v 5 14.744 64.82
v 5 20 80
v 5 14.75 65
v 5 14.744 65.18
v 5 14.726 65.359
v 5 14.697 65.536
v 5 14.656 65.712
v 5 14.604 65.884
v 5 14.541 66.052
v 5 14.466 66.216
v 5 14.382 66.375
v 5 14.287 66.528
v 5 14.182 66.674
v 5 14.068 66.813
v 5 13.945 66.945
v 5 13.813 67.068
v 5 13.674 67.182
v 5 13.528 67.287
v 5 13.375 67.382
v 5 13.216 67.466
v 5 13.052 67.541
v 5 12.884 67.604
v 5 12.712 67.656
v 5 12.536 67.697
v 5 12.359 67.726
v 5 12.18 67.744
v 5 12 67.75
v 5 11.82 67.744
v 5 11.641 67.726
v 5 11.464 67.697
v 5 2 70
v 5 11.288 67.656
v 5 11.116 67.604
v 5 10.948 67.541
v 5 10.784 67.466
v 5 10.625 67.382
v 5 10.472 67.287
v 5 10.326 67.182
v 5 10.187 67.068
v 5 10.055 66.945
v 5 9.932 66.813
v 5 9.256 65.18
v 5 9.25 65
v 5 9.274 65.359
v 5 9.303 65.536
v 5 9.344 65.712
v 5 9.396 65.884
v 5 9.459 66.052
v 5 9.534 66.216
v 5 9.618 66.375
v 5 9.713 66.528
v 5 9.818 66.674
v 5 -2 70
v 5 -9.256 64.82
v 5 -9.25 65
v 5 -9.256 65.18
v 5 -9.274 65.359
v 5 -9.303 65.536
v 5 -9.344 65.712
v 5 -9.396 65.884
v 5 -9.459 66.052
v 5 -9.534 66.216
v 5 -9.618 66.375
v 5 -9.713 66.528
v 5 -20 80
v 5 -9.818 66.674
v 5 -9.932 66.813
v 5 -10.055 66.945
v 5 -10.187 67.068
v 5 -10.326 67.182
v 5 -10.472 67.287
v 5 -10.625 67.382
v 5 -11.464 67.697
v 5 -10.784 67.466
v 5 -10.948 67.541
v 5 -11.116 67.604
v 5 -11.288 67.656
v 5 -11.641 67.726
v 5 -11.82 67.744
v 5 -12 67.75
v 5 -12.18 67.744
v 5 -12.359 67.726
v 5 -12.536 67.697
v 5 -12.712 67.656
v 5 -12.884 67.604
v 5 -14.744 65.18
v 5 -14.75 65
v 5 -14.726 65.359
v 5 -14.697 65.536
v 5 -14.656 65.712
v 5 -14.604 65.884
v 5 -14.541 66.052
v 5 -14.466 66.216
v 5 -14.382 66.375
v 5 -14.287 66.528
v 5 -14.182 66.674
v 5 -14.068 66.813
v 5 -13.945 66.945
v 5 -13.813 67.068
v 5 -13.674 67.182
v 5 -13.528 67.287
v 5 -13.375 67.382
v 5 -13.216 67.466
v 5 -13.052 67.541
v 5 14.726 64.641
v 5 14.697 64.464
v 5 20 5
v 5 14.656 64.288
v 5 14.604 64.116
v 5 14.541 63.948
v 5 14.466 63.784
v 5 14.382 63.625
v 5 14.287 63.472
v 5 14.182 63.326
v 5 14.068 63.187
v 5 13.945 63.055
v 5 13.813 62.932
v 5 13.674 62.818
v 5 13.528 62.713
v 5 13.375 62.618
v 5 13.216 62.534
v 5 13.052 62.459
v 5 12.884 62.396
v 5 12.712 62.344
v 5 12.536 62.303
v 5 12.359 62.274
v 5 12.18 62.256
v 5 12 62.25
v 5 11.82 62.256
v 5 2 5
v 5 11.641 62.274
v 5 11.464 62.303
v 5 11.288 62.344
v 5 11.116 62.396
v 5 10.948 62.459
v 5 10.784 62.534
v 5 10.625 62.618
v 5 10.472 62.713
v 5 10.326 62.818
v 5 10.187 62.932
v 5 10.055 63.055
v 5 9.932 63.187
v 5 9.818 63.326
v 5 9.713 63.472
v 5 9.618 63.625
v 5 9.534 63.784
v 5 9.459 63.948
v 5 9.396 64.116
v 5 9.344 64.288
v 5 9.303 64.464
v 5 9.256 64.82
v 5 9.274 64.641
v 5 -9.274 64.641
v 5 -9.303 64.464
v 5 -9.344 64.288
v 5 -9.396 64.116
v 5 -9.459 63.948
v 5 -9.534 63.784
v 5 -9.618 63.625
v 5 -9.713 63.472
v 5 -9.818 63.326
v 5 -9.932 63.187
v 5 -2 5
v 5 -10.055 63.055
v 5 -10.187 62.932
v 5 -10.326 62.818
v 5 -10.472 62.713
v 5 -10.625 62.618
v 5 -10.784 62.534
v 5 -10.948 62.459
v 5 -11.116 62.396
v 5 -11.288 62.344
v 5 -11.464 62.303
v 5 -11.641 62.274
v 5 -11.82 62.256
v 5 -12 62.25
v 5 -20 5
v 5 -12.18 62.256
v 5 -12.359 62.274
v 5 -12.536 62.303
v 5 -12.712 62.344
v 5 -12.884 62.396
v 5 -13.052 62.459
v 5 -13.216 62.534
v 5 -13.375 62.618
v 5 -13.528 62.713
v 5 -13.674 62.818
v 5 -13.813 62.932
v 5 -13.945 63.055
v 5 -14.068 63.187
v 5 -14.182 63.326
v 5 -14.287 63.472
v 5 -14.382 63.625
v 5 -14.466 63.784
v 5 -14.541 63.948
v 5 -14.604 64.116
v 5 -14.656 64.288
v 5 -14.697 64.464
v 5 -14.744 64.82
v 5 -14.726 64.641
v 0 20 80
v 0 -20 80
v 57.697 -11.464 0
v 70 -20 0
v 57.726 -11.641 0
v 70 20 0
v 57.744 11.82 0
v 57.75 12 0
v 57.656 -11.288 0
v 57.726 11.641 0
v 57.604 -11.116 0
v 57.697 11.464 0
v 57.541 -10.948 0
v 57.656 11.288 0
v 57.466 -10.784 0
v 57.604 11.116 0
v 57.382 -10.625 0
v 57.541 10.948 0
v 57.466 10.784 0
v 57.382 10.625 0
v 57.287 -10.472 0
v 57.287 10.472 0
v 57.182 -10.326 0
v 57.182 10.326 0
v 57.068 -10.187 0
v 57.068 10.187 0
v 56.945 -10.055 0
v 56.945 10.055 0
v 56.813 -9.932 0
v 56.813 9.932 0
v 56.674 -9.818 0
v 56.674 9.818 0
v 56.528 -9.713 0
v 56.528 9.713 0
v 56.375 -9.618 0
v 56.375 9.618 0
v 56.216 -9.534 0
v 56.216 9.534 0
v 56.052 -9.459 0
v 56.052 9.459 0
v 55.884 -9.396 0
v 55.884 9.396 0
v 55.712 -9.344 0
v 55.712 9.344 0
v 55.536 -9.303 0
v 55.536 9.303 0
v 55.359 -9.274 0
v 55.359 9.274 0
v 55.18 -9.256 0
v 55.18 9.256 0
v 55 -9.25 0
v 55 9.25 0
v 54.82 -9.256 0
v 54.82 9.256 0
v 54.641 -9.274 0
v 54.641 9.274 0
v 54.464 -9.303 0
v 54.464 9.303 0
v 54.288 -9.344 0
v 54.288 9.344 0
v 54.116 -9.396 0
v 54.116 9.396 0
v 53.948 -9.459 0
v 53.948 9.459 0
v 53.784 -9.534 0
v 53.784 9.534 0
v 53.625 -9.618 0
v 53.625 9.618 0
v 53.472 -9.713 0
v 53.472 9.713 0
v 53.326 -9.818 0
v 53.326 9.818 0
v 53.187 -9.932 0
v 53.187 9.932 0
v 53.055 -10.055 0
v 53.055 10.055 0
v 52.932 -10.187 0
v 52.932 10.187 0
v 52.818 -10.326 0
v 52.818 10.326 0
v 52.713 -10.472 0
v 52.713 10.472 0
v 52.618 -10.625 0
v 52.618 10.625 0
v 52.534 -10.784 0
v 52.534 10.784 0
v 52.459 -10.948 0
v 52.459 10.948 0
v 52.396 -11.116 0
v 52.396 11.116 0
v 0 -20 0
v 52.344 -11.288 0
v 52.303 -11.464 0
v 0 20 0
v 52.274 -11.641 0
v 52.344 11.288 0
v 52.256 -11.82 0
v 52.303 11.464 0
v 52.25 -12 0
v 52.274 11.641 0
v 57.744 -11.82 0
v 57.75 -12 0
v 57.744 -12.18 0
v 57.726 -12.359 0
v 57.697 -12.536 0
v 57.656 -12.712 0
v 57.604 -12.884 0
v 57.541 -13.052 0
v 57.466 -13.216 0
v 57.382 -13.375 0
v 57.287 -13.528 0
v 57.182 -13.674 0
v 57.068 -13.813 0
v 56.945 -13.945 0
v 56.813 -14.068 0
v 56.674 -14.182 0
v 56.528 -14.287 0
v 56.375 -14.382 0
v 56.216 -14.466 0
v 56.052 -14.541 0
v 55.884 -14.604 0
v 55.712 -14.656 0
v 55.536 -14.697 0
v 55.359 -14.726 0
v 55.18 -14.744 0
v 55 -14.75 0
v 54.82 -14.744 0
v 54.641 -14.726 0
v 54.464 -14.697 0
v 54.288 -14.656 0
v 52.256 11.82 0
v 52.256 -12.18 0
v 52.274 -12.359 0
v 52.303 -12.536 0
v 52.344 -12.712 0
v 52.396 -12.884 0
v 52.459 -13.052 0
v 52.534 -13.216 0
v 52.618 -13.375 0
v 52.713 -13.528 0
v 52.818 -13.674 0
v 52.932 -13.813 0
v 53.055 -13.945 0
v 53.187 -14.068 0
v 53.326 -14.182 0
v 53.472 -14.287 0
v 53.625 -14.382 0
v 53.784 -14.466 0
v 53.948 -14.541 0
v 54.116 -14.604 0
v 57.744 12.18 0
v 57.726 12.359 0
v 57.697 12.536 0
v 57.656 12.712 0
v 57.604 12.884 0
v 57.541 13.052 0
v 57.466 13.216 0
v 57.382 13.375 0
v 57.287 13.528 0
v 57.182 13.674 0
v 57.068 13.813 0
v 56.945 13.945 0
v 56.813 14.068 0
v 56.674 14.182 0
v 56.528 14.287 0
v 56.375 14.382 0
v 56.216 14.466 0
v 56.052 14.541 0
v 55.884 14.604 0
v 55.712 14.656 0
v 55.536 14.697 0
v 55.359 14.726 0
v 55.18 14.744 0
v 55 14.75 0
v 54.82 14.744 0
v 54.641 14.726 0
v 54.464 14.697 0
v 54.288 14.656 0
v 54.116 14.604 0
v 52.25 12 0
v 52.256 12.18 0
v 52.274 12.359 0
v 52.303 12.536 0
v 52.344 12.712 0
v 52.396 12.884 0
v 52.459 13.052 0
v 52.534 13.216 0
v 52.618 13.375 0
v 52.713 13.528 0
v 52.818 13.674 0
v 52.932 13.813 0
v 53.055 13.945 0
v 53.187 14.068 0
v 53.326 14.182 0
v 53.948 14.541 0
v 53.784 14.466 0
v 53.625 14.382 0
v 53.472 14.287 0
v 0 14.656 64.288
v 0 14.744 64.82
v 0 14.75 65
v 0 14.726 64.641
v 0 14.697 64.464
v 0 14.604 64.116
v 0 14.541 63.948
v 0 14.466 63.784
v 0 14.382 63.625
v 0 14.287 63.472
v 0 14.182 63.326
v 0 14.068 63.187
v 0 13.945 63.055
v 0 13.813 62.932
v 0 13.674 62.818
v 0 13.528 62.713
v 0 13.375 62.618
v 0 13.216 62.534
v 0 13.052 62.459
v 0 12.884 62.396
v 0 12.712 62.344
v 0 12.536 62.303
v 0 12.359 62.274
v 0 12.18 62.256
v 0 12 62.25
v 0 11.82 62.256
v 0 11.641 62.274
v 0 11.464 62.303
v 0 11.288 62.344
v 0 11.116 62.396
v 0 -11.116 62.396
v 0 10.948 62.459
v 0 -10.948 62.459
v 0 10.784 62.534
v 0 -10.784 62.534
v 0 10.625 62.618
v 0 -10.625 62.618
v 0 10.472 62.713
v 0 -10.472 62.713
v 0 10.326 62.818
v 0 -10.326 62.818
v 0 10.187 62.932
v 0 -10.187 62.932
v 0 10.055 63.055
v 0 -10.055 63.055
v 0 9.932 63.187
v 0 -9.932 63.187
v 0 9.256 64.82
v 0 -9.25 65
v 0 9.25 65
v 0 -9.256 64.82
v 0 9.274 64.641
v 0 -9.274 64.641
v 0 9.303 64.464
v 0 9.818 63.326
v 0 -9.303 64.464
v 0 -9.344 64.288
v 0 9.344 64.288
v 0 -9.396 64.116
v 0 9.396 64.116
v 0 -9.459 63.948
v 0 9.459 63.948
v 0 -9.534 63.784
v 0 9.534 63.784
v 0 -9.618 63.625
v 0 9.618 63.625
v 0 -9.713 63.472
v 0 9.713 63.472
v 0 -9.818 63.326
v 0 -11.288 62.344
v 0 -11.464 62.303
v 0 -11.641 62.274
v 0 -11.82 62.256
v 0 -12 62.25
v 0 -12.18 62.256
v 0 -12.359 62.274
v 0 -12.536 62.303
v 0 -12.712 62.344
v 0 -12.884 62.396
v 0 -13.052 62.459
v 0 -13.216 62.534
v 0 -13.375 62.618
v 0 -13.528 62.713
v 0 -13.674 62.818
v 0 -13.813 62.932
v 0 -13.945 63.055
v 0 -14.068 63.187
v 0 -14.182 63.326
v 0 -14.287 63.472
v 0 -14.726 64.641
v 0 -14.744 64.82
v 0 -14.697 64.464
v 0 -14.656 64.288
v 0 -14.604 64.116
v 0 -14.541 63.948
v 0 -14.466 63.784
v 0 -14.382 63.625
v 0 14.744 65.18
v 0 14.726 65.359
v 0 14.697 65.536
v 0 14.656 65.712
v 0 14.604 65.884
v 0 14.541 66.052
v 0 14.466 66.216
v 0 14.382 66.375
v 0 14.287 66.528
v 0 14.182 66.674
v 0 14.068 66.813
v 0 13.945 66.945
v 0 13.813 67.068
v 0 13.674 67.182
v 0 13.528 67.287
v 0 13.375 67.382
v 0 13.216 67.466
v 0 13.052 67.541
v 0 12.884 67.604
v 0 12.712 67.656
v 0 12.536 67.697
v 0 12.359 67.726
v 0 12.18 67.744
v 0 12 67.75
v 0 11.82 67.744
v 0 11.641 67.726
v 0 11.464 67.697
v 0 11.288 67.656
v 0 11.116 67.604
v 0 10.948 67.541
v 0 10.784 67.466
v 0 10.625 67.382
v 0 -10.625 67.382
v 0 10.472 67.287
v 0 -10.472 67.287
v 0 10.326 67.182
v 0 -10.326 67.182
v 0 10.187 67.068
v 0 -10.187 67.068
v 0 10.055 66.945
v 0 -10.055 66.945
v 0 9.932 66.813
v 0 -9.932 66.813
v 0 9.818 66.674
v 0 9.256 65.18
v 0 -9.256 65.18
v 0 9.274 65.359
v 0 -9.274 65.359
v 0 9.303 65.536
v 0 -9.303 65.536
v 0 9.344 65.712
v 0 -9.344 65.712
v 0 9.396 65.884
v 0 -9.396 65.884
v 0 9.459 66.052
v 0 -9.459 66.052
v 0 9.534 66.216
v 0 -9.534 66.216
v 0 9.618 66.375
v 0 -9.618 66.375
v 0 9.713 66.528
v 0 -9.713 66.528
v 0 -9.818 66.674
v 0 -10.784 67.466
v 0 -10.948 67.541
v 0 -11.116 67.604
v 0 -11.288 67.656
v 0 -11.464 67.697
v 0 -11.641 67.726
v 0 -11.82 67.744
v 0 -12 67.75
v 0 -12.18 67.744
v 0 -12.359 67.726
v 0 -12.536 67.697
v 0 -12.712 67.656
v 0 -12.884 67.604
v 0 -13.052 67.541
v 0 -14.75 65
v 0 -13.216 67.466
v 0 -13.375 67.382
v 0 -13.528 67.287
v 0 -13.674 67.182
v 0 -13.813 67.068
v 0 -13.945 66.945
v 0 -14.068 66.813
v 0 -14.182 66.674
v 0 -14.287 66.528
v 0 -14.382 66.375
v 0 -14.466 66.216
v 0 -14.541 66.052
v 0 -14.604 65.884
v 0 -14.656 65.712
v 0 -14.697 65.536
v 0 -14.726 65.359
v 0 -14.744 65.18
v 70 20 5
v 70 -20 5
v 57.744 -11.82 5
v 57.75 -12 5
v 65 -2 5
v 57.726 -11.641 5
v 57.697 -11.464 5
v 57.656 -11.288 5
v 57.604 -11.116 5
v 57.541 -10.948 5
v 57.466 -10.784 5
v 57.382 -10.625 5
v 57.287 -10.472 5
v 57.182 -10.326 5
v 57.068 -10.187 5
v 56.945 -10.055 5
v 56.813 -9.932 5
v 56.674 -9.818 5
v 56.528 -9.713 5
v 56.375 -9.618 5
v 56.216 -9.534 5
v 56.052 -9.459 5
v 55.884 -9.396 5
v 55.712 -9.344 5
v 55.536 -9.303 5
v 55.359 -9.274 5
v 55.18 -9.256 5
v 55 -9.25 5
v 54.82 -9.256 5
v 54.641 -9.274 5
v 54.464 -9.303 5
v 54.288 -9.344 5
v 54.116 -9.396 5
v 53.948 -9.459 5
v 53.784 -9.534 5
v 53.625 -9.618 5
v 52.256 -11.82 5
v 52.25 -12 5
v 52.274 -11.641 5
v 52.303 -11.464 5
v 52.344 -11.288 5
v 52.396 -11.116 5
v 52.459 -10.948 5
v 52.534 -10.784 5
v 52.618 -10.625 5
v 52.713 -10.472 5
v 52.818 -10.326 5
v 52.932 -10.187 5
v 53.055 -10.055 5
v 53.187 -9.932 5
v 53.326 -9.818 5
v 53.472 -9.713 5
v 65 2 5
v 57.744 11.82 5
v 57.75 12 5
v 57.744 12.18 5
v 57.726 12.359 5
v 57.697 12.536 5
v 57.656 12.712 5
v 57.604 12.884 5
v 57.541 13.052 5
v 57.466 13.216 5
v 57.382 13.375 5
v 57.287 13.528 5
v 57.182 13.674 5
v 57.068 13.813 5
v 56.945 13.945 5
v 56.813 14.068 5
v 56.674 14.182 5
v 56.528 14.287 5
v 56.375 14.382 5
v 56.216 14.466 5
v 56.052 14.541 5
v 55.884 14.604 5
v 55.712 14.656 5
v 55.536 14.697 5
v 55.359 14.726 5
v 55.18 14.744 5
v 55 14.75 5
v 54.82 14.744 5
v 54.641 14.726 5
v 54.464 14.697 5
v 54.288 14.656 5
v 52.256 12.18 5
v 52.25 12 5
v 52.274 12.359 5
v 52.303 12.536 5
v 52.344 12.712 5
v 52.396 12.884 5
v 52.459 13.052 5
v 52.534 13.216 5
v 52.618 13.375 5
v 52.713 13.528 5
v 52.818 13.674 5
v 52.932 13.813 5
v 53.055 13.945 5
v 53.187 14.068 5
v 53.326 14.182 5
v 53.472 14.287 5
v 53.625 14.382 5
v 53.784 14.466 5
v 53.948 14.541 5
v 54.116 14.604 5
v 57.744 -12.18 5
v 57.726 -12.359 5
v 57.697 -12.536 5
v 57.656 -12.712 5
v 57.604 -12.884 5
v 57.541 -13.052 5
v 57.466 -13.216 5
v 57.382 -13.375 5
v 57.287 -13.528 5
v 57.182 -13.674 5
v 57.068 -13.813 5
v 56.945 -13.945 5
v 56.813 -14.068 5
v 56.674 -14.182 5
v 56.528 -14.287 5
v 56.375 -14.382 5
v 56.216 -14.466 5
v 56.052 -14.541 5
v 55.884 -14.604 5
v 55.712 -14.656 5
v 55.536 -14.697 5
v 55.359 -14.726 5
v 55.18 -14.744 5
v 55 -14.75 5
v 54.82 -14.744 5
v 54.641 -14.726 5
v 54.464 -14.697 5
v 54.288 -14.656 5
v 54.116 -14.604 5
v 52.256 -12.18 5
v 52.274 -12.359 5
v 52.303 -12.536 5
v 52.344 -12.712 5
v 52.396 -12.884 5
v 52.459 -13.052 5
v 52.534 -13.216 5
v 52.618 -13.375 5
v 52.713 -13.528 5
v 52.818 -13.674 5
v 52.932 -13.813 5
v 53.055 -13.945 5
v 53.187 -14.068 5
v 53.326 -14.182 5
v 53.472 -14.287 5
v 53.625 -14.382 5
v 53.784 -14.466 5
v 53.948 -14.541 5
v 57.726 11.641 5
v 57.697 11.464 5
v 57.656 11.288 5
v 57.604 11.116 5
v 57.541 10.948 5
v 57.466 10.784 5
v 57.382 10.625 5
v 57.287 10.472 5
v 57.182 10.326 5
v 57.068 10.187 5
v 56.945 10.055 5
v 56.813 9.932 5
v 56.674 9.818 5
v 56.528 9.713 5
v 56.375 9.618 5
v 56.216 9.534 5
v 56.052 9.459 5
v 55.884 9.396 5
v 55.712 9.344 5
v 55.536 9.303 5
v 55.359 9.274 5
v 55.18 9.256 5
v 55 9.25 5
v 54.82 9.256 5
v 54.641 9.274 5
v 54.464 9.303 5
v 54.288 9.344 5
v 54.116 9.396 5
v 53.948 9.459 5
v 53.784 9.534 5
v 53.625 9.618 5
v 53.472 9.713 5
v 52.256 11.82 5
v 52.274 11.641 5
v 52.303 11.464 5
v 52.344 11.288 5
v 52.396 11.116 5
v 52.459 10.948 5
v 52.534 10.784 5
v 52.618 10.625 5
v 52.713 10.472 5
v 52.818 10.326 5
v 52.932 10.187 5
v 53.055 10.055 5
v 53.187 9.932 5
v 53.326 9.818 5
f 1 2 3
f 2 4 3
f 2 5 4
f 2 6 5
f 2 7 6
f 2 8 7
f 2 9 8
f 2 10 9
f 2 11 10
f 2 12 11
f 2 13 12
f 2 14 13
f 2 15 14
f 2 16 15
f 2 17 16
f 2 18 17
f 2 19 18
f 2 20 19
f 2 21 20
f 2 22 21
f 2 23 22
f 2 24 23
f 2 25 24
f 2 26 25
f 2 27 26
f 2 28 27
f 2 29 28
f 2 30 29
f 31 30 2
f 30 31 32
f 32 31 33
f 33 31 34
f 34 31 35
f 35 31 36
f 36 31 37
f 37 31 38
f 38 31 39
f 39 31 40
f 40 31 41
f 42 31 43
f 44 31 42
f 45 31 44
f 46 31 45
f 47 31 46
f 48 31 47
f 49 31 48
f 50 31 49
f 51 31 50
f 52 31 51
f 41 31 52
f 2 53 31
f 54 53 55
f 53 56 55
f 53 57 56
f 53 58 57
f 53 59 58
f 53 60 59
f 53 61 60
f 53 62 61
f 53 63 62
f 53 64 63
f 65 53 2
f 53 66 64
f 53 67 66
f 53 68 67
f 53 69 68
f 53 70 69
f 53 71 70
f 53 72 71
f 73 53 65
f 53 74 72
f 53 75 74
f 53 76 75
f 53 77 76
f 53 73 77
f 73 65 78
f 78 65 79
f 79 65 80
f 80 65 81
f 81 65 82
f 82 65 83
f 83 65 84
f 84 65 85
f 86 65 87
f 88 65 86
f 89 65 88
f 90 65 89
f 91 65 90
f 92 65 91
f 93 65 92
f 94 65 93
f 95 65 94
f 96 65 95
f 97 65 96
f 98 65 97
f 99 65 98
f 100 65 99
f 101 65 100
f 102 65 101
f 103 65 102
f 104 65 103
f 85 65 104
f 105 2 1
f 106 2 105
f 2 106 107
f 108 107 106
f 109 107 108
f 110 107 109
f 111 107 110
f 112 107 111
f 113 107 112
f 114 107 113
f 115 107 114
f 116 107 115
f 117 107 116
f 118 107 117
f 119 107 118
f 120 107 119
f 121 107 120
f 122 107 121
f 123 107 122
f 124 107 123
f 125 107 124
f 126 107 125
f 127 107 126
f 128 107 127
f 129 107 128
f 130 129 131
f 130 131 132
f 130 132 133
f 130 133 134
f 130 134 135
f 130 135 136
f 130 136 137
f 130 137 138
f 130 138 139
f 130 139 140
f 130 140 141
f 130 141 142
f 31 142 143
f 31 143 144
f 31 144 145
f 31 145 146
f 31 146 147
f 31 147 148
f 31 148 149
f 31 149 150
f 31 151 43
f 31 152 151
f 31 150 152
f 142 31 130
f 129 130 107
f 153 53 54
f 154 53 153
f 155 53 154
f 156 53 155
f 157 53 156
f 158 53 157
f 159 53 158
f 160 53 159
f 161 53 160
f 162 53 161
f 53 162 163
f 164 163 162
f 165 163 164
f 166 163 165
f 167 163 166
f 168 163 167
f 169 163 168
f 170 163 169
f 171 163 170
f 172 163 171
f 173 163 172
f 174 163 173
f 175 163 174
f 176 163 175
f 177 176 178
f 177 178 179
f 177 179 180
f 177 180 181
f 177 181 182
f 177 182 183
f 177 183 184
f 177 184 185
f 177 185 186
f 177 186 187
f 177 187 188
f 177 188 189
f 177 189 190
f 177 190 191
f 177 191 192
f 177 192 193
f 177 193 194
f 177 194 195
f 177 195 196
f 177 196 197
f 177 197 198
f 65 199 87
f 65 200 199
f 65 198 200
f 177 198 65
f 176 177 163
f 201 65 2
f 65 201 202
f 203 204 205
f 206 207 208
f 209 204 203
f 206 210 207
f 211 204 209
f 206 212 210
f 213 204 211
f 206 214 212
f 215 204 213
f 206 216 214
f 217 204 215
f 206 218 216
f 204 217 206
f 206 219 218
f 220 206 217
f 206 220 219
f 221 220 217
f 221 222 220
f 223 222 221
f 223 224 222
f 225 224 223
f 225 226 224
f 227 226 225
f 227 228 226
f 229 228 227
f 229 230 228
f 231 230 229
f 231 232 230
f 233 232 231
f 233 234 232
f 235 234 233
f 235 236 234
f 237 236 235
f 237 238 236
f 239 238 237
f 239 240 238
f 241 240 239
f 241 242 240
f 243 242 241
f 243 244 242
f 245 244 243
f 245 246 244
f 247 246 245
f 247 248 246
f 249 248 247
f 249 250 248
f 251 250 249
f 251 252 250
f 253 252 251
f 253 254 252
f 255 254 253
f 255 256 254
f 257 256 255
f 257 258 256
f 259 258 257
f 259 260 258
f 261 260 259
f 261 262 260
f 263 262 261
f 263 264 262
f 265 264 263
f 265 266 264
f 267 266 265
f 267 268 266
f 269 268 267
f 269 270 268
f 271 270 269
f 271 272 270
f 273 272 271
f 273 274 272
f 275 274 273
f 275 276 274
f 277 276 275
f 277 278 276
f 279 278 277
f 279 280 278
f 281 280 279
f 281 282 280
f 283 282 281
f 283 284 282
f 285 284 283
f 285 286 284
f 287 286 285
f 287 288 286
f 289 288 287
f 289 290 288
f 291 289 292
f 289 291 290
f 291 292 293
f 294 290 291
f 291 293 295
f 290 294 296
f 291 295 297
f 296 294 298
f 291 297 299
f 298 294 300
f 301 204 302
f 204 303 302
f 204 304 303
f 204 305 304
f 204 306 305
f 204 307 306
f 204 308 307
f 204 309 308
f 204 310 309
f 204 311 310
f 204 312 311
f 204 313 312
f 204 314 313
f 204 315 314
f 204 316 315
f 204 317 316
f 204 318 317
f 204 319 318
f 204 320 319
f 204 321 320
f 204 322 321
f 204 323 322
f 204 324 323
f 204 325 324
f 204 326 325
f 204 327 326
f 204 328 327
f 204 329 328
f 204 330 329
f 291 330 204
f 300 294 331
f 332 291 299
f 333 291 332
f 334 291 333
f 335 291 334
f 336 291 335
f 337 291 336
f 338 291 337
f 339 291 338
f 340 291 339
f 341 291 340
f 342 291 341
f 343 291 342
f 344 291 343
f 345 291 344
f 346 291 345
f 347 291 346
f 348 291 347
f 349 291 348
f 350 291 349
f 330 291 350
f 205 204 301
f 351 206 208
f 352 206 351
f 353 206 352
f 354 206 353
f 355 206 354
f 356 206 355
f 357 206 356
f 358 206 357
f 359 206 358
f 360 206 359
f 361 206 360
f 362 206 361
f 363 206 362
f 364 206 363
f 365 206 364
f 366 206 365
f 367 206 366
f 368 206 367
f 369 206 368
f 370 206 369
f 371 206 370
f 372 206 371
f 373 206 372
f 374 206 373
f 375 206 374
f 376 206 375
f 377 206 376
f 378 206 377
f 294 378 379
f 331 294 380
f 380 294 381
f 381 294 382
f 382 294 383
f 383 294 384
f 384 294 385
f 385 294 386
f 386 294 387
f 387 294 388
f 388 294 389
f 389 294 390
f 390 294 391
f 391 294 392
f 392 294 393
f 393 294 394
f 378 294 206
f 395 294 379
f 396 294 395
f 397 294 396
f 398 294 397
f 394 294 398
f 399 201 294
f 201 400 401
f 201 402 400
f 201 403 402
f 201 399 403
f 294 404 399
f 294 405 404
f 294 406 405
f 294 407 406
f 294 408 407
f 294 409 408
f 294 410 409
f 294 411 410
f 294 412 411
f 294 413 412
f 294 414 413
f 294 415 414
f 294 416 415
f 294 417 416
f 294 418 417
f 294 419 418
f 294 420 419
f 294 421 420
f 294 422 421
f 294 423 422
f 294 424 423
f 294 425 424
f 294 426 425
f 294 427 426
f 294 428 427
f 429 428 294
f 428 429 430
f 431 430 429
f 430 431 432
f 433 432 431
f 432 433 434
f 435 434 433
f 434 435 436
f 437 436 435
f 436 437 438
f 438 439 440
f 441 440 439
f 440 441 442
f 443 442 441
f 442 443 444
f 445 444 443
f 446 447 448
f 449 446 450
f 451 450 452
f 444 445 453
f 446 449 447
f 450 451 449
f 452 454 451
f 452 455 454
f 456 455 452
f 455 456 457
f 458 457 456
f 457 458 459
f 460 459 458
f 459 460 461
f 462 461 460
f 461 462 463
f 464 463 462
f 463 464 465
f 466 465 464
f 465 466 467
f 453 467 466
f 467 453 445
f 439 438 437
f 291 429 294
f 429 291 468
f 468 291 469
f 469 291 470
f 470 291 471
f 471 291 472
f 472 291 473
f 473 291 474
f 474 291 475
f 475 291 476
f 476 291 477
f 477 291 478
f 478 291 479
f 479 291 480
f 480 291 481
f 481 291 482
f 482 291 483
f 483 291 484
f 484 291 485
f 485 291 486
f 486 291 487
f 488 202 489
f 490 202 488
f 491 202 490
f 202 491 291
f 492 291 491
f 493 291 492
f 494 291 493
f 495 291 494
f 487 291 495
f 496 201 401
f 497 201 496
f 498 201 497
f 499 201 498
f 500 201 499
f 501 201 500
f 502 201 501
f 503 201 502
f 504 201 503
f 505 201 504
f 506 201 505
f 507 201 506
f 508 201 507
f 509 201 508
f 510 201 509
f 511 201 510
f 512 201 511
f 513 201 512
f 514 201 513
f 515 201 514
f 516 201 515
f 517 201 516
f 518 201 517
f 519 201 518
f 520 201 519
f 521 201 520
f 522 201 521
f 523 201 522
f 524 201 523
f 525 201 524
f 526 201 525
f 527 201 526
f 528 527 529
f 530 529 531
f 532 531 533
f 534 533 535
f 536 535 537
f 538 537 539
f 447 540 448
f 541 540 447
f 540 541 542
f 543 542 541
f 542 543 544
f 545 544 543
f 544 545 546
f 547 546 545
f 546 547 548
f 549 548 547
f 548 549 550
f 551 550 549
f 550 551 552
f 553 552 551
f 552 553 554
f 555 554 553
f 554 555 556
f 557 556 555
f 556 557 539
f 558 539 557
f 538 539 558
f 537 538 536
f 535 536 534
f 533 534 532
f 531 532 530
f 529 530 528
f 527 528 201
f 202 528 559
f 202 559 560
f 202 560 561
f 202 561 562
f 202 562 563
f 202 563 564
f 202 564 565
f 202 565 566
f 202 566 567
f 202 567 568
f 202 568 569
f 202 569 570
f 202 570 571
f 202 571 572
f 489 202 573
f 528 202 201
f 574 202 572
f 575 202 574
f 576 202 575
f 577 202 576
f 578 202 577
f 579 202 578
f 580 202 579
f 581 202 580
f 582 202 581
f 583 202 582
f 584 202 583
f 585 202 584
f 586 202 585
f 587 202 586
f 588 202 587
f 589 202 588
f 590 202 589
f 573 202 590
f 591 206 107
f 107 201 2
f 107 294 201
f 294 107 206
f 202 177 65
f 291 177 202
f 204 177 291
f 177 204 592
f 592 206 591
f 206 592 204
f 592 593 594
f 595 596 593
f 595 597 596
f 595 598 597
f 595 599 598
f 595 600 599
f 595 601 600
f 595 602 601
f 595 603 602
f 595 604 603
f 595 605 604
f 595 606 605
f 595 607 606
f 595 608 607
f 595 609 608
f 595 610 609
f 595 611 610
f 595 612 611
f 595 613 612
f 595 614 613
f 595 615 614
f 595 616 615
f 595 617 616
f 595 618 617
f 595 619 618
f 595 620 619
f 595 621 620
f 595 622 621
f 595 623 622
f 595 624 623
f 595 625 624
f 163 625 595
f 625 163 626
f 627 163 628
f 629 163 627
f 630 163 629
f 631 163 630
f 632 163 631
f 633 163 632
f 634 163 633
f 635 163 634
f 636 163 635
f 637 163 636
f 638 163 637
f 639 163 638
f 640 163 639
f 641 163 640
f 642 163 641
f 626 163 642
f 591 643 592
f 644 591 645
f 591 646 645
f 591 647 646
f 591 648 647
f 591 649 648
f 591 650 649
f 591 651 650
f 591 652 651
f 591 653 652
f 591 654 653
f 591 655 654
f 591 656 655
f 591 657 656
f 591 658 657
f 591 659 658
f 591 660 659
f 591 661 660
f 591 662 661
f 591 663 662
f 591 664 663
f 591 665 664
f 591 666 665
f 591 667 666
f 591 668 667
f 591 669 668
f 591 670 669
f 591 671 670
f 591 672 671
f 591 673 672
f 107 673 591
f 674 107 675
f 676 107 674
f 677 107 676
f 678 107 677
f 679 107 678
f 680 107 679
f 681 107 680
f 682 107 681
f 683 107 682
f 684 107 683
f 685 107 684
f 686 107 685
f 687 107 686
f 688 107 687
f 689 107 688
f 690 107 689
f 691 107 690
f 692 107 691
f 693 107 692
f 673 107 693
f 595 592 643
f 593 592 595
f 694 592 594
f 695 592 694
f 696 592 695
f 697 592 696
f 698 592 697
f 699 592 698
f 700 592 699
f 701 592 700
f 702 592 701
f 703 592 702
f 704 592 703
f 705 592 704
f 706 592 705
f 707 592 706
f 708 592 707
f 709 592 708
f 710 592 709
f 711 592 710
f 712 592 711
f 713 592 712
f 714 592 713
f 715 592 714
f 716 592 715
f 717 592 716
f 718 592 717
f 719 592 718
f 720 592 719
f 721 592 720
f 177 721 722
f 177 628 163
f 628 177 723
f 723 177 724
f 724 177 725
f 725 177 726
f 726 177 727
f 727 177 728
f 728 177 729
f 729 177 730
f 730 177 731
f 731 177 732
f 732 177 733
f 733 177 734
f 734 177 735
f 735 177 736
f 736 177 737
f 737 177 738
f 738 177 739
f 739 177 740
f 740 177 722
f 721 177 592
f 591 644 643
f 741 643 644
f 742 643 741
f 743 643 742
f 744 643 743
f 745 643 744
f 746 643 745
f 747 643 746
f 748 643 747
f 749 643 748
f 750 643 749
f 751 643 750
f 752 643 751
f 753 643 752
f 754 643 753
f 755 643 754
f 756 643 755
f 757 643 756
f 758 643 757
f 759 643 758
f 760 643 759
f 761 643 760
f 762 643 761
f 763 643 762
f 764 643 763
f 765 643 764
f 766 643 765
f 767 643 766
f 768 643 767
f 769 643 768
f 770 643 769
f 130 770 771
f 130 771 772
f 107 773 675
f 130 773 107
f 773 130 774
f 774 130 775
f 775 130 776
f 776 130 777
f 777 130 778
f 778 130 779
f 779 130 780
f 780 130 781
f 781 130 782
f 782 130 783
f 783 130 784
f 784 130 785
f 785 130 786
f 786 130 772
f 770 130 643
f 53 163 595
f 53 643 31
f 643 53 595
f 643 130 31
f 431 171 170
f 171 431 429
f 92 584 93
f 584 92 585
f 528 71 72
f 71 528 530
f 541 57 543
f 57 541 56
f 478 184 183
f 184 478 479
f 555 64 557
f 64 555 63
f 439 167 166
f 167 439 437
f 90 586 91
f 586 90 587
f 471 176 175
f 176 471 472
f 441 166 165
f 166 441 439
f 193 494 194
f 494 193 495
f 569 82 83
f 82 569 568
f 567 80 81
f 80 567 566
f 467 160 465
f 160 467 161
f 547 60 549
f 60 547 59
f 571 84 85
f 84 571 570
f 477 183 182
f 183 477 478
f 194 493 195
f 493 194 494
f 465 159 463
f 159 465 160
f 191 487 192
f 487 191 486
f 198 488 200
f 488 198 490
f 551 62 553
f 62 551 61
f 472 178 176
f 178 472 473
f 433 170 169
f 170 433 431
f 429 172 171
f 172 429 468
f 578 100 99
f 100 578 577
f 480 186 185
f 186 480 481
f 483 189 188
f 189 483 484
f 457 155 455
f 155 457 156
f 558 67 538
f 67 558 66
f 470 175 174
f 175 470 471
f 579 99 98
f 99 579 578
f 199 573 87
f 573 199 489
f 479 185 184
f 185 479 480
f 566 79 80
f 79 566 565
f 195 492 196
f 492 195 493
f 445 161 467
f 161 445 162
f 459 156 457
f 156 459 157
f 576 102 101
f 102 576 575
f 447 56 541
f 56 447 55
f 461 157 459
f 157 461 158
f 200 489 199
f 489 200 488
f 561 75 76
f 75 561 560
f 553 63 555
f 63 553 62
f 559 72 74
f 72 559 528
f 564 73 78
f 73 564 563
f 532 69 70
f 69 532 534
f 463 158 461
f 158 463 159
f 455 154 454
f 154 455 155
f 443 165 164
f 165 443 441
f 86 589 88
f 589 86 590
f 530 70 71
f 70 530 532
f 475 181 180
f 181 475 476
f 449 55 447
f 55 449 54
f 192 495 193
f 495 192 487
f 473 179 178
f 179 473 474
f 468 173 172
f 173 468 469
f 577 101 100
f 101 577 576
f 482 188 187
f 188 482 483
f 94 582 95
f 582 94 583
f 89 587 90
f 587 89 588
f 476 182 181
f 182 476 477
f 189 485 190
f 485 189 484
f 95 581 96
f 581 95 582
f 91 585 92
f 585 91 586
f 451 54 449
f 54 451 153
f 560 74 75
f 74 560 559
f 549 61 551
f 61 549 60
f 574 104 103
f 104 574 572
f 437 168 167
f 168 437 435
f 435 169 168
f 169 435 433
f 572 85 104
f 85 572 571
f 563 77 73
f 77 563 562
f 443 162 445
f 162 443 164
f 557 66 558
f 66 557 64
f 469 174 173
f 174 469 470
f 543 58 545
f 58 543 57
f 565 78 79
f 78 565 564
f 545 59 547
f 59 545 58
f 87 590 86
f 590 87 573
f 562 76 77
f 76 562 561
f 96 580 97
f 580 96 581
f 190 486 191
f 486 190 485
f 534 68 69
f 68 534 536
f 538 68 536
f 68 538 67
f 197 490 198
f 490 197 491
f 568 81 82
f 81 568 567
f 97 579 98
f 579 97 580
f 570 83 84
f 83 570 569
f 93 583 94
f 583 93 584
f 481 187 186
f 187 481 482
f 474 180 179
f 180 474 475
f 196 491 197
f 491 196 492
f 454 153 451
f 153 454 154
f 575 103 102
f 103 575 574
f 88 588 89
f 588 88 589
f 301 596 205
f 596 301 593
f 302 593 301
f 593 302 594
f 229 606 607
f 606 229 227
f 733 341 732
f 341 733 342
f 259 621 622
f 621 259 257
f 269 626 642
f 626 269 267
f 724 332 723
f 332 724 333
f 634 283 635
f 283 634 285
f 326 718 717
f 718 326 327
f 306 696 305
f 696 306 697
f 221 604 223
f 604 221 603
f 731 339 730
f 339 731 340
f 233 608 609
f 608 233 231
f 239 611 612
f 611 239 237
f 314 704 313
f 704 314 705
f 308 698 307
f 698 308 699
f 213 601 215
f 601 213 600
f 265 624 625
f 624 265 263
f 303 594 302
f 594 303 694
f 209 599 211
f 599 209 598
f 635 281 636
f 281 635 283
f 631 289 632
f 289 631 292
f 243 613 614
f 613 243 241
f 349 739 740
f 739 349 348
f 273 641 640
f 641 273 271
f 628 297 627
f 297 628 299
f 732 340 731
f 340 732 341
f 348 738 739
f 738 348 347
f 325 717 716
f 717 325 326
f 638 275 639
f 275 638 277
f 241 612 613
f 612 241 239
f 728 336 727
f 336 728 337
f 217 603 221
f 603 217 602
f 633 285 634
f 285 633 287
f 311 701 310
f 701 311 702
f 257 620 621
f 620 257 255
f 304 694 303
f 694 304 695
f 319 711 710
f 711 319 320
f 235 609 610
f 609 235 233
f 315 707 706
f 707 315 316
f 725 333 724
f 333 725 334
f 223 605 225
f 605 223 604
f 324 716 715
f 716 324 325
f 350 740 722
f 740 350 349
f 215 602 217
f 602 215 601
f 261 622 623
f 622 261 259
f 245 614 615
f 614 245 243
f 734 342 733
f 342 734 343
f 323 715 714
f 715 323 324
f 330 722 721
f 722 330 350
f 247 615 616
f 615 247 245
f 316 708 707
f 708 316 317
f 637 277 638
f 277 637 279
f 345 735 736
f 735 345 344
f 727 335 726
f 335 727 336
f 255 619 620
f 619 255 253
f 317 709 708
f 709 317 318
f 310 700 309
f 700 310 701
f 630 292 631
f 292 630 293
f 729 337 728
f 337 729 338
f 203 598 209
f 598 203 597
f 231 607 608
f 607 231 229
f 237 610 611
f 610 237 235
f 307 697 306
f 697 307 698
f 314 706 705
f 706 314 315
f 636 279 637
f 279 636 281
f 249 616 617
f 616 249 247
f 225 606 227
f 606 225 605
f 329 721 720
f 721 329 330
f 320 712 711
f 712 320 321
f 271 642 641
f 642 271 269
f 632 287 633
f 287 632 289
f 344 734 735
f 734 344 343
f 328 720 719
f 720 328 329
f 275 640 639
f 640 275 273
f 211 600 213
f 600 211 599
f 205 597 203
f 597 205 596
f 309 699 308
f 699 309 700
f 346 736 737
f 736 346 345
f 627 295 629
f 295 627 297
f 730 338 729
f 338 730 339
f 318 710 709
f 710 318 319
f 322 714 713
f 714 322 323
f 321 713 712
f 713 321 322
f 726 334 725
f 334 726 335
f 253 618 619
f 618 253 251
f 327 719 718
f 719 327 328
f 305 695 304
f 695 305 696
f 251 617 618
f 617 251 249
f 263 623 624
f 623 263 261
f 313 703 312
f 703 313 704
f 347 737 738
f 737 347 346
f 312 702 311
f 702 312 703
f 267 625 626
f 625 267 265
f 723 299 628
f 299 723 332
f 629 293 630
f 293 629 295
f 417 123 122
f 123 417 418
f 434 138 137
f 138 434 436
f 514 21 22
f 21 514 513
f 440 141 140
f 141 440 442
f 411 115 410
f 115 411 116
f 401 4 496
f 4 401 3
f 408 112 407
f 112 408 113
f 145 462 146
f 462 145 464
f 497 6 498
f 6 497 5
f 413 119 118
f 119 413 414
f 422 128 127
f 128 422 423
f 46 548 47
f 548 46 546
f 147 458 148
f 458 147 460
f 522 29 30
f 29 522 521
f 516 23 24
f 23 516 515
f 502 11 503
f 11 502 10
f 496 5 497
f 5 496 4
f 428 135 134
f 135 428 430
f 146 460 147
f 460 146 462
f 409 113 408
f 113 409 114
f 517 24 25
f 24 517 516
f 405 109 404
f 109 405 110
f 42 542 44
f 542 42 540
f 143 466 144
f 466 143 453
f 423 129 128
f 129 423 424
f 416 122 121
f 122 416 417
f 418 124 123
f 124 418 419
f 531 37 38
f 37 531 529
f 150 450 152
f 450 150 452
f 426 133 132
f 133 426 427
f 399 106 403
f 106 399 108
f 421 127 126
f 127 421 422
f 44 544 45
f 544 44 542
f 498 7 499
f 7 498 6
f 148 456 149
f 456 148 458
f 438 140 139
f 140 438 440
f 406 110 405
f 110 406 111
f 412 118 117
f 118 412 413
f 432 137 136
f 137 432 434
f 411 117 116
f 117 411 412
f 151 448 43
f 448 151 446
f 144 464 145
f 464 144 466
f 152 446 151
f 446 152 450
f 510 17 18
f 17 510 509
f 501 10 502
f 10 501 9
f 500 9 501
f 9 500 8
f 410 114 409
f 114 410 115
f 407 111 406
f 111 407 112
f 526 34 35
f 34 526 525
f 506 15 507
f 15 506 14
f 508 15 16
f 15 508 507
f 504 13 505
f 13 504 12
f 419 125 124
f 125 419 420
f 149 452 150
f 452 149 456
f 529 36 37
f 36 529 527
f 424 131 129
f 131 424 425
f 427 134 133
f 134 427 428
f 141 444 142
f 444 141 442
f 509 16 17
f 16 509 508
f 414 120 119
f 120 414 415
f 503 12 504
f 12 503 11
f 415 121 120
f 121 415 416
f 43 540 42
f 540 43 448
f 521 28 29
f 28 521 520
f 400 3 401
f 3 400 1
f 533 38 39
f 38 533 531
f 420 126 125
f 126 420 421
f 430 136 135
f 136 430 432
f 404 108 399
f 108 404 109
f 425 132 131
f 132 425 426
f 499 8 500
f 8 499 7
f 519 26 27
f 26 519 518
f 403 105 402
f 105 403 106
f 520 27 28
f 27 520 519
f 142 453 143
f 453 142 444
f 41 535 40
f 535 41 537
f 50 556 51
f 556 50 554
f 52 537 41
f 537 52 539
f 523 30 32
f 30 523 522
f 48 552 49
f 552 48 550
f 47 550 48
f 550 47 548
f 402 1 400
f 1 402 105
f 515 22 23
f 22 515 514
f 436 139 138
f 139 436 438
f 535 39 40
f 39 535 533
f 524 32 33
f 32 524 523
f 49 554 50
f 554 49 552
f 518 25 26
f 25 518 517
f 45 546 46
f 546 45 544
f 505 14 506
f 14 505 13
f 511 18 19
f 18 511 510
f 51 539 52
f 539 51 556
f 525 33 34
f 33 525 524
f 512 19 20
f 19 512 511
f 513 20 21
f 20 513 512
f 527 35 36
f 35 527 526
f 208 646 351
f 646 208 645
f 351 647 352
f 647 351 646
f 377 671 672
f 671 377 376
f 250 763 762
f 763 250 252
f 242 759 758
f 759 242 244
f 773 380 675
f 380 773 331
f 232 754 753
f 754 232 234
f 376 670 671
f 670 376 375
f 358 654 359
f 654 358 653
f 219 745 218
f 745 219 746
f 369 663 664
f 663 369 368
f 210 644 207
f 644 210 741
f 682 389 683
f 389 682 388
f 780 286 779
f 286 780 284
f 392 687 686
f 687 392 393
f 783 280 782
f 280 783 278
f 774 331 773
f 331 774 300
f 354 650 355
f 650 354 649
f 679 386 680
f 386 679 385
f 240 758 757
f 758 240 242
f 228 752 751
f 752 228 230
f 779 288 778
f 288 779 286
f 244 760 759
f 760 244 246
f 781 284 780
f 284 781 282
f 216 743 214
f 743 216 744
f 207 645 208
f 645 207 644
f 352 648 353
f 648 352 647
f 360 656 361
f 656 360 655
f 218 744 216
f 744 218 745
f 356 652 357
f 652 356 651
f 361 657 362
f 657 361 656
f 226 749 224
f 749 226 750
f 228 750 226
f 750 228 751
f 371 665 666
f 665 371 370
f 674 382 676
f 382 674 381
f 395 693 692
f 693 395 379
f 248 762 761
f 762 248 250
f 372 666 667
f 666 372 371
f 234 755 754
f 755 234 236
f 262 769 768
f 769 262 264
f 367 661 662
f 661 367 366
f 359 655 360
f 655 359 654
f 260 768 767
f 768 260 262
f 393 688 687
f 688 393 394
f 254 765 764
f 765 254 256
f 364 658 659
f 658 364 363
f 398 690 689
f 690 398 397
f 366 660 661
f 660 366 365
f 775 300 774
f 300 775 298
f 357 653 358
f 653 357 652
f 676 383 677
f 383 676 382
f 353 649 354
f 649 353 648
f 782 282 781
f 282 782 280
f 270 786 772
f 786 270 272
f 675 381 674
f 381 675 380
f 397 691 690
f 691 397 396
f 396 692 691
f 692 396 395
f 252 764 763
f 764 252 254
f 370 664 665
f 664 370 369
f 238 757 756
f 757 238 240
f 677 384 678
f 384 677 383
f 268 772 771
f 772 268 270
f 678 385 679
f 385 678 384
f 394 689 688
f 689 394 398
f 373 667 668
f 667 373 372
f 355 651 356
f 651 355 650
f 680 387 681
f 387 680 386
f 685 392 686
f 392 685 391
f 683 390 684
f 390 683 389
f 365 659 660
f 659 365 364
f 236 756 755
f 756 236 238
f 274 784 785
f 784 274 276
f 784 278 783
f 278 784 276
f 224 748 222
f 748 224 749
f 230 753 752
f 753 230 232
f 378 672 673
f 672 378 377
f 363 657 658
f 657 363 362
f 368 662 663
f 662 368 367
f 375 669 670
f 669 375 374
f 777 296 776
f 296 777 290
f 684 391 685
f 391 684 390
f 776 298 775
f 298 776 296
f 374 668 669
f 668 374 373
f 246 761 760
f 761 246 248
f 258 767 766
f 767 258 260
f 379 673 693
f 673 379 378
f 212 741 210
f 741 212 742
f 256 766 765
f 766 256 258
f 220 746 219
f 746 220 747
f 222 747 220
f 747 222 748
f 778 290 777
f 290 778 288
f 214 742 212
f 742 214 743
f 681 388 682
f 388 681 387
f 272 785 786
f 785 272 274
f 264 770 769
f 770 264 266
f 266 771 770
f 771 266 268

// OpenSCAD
shelf_depth = 70; wall_height = 80; plate_thickness = 5; width = 40;
rib_thickness = 4; rib_leg_x = 60; rib_leg_z = 65;
hole_diameter = 5.5; hole_y = 12; wall_hole_z = 65; shelf_hole_x = 55;
$fn = 96;
t = plate_thickness;
difference() {
  union() {
    translate([0, -width/2, 0]) cube([t, width, wall_height]);
    translate([0, -width/2, 0]) cube([shelf_depth, width, t]);
    // XZ triangle, sunk 1 mm into both plates; 2D (x,y) -> (X,Z)
    rotate([90, 0, 0]) linear_extrude(rib_thickness, center = true)
      polygon([[t - 1, t - 1], [t + rib_leg_x, t - 1], [t + rib_leg_x, t], [t, t + rib_leg_z], [t - 1, t + rib_leg_z]]);
  }
  for (y = [-hole_y, hole_y]) {
    translate([-1, y, wall_hole_z]) rotate([0, 90, 0]) cylinder(d = hole_diameter, h = t + 2);
    translate([shelf_hole_x, y, -1]) cylinder(d = hole_diameter, h = t + 2);
  }
}
